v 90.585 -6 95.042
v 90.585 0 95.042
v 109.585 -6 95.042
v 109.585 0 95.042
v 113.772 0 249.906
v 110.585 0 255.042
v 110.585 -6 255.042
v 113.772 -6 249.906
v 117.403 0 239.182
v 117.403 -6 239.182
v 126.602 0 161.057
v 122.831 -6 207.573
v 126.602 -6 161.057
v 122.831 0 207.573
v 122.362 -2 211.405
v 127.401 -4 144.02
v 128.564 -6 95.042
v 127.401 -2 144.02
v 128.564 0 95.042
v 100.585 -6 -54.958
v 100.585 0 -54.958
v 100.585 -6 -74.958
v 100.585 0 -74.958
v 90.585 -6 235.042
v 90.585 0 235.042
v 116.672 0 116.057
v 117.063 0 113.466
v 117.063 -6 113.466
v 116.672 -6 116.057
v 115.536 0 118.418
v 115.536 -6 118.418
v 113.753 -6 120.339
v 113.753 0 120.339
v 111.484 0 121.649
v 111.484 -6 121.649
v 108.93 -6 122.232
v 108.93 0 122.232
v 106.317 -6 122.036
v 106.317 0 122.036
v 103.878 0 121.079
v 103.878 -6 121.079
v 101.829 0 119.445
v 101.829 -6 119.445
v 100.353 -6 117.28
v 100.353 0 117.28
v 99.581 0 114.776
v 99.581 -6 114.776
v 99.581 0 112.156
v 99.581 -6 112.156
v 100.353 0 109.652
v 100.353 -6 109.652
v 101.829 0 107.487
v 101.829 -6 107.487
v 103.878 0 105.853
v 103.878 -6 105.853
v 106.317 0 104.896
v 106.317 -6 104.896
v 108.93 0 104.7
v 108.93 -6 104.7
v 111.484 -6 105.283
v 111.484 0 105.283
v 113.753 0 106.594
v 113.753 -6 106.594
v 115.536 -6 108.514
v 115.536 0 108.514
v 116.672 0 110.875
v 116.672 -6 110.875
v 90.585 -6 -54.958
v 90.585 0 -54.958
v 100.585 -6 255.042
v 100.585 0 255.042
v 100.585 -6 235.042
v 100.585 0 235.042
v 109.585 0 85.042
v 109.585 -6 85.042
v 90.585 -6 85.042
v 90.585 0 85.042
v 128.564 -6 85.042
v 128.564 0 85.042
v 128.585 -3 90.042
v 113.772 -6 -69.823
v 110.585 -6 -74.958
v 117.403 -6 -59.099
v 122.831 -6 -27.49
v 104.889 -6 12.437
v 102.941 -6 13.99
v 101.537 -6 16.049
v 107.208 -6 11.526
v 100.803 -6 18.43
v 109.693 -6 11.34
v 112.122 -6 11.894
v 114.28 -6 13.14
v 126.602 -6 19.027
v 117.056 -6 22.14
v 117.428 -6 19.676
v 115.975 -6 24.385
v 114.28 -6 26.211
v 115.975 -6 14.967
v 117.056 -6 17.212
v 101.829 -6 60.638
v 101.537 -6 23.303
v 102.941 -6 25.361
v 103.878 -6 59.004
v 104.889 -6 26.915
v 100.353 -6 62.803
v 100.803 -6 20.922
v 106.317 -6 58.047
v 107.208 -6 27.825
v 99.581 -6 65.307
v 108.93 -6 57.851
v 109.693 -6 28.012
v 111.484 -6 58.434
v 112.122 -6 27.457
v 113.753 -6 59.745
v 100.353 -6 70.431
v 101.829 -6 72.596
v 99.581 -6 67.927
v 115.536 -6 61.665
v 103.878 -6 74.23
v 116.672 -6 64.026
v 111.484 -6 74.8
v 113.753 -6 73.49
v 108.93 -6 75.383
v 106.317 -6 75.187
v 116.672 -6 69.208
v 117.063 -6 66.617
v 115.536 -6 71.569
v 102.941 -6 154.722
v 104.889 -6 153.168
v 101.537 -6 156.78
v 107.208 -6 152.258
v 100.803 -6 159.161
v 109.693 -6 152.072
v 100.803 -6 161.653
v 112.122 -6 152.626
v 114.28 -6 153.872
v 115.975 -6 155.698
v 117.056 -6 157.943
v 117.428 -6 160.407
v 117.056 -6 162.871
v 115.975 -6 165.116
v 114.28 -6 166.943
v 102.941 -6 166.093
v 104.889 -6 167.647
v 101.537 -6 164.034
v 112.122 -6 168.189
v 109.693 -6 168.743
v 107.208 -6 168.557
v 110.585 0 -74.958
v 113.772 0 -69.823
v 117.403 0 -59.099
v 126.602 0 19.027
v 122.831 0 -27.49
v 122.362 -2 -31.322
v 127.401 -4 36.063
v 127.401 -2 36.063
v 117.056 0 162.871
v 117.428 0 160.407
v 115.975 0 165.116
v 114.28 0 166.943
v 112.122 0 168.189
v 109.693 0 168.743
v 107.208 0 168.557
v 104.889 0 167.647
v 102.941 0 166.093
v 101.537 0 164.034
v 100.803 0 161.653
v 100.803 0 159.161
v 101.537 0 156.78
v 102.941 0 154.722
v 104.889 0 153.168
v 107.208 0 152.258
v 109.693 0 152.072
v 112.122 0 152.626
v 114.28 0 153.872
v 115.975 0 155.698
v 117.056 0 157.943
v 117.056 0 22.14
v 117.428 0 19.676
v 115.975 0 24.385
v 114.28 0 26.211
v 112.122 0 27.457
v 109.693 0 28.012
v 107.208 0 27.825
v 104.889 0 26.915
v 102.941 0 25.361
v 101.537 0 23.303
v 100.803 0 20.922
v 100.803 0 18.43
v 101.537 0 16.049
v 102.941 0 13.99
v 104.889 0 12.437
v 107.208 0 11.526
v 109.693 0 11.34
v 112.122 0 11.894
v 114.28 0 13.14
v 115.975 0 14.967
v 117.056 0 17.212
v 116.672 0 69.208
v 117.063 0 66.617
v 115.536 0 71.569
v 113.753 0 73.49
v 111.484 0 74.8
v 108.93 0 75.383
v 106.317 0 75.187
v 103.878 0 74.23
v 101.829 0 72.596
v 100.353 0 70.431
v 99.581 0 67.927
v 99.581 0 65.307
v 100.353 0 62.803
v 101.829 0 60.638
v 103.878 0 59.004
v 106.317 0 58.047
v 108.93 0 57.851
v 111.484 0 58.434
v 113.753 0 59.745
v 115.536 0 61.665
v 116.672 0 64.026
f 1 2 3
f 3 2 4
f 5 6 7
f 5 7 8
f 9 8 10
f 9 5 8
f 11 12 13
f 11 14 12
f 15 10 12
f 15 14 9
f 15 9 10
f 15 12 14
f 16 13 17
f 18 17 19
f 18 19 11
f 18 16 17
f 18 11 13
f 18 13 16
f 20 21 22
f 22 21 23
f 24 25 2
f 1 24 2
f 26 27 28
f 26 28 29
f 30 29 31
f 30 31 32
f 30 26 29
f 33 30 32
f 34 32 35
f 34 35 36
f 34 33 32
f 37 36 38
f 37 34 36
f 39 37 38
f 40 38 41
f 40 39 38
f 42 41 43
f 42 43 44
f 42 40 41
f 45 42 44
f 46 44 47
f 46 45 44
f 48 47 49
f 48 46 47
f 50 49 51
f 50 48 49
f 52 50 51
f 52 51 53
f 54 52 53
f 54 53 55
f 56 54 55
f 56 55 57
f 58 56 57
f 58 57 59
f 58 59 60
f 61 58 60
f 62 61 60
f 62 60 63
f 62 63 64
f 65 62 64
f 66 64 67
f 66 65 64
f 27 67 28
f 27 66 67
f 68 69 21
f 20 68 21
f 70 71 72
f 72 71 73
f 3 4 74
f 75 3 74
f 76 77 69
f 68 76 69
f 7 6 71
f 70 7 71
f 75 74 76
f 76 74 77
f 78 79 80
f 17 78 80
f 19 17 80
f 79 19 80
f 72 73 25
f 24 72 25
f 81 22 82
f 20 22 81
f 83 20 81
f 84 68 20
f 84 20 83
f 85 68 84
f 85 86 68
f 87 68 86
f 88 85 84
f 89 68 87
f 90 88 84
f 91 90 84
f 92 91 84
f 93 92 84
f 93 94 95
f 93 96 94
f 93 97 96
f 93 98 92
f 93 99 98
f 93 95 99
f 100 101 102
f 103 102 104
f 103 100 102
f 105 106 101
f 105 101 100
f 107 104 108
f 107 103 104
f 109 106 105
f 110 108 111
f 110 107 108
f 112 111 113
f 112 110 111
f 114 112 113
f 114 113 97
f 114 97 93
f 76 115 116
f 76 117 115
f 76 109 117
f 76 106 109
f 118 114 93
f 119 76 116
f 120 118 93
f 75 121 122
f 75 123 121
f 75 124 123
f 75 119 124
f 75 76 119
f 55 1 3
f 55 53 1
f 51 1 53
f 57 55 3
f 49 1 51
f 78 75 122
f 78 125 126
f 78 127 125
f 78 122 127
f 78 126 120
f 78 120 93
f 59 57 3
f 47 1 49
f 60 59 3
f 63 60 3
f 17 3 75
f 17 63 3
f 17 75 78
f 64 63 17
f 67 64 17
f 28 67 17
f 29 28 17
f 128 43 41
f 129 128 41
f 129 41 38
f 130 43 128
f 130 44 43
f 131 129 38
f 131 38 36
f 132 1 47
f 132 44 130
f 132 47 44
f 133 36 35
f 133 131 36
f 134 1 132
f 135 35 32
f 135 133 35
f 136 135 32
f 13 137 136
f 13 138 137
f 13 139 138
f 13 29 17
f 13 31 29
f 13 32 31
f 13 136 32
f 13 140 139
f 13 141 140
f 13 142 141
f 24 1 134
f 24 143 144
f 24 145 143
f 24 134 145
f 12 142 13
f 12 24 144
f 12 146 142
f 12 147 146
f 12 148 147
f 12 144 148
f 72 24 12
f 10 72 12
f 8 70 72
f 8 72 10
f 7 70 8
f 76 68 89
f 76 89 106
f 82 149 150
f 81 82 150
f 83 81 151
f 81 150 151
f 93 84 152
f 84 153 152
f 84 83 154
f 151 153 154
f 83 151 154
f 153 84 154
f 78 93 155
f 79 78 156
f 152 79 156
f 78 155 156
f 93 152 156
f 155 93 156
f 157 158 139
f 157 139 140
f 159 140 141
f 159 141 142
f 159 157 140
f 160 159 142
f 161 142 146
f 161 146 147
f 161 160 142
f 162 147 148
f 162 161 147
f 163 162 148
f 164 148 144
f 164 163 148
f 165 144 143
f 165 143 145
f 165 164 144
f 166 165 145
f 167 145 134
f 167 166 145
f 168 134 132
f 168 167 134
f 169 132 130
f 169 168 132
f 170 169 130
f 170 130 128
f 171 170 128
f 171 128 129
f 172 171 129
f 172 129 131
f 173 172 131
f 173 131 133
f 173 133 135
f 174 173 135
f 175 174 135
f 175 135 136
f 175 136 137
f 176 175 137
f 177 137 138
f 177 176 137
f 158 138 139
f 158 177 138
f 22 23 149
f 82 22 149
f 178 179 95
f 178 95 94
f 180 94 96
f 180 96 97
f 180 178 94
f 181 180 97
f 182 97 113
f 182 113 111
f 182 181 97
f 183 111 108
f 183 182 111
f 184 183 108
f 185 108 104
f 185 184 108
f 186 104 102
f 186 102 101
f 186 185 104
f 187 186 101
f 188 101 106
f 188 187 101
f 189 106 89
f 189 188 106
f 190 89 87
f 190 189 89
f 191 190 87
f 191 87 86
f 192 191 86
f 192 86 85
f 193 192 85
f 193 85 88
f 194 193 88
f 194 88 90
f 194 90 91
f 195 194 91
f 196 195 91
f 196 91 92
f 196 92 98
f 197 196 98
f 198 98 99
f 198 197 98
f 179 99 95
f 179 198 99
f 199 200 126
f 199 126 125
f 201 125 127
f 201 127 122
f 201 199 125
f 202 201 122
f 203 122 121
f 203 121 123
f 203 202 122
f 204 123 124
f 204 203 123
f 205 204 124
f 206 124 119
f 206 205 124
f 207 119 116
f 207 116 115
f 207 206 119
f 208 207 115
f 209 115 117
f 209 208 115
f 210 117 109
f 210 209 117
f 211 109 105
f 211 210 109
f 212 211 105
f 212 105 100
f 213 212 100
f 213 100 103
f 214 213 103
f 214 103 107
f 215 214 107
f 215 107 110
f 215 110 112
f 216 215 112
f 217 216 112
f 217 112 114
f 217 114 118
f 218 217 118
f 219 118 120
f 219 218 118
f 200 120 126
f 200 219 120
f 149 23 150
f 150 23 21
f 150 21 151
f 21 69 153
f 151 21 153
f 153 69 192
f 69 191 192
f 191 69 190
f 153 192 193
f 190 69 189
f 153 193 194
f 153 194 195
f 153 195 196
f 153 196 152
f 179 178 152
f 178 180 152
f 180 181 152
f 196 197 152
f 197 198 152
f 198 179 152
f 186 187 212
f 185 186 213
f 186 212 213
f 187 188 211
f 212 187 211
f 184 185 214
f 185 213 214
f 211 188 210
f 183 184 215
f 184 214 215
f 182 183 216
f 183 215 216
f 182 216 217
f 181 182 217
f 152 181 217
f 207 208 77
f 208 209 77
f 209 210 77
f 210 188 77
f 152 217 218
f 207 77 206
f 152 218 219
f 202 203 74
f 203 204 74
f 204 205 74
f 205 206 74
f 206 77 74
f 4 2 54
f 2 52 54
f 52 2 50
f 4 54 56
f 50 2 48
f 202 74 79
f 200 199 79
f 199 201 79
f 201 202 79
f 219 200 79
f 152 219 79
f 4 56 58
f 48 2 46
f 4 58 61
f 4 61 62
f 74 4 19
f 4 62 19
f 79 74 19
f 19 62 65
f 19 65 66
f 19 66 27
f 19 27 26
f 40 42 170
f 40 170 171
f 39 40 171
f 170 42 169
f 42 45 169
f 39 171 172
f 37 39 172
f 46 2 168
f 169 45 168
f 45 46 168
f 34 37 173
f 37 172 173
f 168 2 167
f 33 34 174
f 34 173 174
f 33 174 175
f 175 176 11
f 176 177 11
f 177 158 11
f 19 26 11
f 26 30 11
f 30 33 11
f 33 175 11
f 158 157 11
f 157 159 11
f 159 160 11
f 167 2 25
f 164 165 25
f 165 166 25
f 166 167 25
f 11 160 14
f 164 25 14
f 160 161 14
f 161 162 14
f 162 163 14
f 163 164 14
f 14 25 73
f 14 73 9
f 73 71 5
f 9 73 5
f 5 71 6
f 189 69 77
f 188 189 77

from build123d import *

# Parameters (mm, degrees)
F0_R     = 8.3591394984
F0_R_2   = 8.7902247906
F1_DEPTH = 6


# Not quite as in the source:
# - a feature names something its author has since deleted; it is built from what else it names


with BuildPart() as f1:
    # F0 (on Front) → F1 (new body)
    with BuildSketch(Plane.XZ):
        with BuildLine():
            Line((100.5853836174, -74.9584571321), (110.5853836174, -74.9584571321))
            add(Edge.make_bspline(
                [(110.5853836174, -74.9584571321), (126.6854561112, -57.248377389), (128.3848433658, 59.317552439), (128.5642162874, 85.0415428679)],
                knots=[0, 0, 0, 0, 148.4595862799, 148.4595862799, 148.4595862799, 148.4595862799], degree=3))
            Line((128.5642162874, 85.0415428679), (109.5853836174, 85.0415428679))
            Line((109.5853836174, 85.0415428679), (90.5853836174, 85.0415428679))
            Line((90.5853836174, 85.0415428679), (90.5853836174, -54.9584571321))
            Line((90.5853836174, -54.9584571321), (100.5853836174, -54.9584571321))
            Line((100.5853836174, -54.9584571321), (100.5853836174, -74.9584571321))
        make_face()
        with Locations((109.0683937073, 19.6757875151)):
            Circle(F0_R, mode=Mode.SUBTRACT)
        with Locations((108.2727760077, 66.6170529789)):
            Circle(F0_R_2, mode=Mode.SUBTRACT)
        with BuildLine():
            add(Edge.make_bspline(
                [(128.5642162874, 85.0415428679), (128.5853836174, 88.0771637948), (128.5853836174, 89.8477431573), (128.5853836174, 90.0415428679)],
                knots=[148.4595862799, 148.4595862799, 148.4595862799, 148.4595862799, 165.9789143235, 165.9789143235, 165.9789143235, 165.9789143235], degree=3))
            Line((128.5853836174, 90.0415428679), (109.5853836174, 90.0415428679))
            Line((109.5853836174, 90.0415428679), (109.5853836174, 85.0415428679))
            Line((109.5853836174, 85.0415428679), (128.5642162874, 85.0415428679))
        make_face()
        with BuildLine():
            Line((109.5853836174, 90.0415428679), (128.5853836174, 90.0415428679))
            add(Edge.make_bspline(
                [(128.5642162874, 95.0415428679), (128.5853836174, 92.005921941), (128.5853836174, 90.2353425785), (128.5853836174, 90.0415428679)],
                knots=[148.4595862799, 148.4595862799, 148.4595862799, 148.4595862799, 165.9789143235, 165.9789143235, 165.9789143235, 165.9789143235], degree=3))
            Line((128.5642162874, 95.0415428679), (109.5853836174, 95.0415428679))
            Line((109.5853836174, 95.0415428679), (109.5853836174, 90.0415428679))
        make_face()
        with BuildLine():
            Line((109.5853836174, 95.0415428679), (128.5642162874, 95.0415428679))
            add(Edge.make_bspline(
                [(110.5853836174, 255.0415428679), (126.6854561112, 237.3314631248), (128.3848433658, 120.7655332968), (128.5642162874, 95.0415428679)],
                knots=[0, 0, 0, 0, 148.4595862799, 148.4595862799, 148.4595862799, 148.4595862799], degree=3))
            Line((110.5853836174, 255.0415428679), (100.5853836174, 255.0415428679))
            Line((100.5853836174, 255.0415428679), (100.5853836174, 235.0415428679))
            Line((100.5853836174, 235.0415428679), (90.5853836174, 235.0415428679))
            Line((90.5853836174, 235.0415428679), (90.5853836174, 95.0415428679))
            Line((90.5853836174, 95.0415428679), (109.5853836174, 95.0415428679))
        make_face()
        with Locations((108.2727760077, 113.4660327569)):
            Circle(F0_R_2, mode=Mode.SUBTRACT)
        with Locations((109.0683937073, 160.4072982207)):
            Circle(F0_R, mode=Mode.SUBTRACT)
    extrude(amount=F1_DEPTH)


solid = f1.part
